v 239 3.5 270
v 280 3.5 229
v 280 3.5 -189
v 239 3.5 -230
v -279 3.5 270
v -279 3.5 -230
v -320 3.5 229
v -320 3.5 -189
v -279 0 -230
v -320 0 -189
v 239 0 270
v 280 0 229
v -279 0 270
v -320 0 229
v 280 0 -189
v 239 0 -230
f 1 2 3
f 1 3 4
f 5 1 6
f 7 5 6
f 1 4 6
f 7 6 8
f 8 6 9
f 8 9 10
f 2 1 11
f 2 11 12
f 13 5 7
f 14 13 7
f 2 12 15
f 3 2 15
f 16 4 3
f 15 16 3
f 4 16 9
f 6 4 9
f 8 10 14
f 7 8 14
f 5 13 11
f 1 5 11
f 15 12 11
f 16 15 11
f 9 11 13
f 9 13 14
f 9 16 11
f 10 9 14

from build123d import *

# Parameters (mm, degrees)
BOSS_EXTRUDE1_DEPTH = 3.5
CUT_EXTRUDE1_DEPTH  = 4.5


with BuildPart() as part:
    # Sketch1 → Boss-Extrude1 (new body)
    with BuildSketch(Plane(origin=(0, 0, 0), x_dir=(1, 0, 0), z_dir=(0, 1, 0))):
        Polygon((-280, 230), (260, 230), (280, 230), (280, 210), (280, -250), (280, -270), (260, -270), (-280, -270), (-320, -270), (-320, -250), (-320, 210), (-320, 230), align=None)
    extrude(amount=BOSS_EXTRUDE1_DEPTH)

    # Sketch2 → Cut-Extrude1 (cut, through all)
    with BuildSketch(Plane(origin=(0, 3.5, 0), x_dir=(1, 0, 0), z_dir=(0, 1, 0))):
        Polygon((-320, -229), (-320, -270), (-279, -270), align=None)
        Polygon((-320, 230), (-279, 230), (-320, 189), align=None)
        Polygon((280, -270), (239, -270), (280, -229), align=None)
        Polygon((280, 189), (280, 230), (239, 230), align=None)
    extrude(amount=-CUT_EXTRUDE1_DEPTH, mode=Mode.SUBTRACT)


solid = part.part
